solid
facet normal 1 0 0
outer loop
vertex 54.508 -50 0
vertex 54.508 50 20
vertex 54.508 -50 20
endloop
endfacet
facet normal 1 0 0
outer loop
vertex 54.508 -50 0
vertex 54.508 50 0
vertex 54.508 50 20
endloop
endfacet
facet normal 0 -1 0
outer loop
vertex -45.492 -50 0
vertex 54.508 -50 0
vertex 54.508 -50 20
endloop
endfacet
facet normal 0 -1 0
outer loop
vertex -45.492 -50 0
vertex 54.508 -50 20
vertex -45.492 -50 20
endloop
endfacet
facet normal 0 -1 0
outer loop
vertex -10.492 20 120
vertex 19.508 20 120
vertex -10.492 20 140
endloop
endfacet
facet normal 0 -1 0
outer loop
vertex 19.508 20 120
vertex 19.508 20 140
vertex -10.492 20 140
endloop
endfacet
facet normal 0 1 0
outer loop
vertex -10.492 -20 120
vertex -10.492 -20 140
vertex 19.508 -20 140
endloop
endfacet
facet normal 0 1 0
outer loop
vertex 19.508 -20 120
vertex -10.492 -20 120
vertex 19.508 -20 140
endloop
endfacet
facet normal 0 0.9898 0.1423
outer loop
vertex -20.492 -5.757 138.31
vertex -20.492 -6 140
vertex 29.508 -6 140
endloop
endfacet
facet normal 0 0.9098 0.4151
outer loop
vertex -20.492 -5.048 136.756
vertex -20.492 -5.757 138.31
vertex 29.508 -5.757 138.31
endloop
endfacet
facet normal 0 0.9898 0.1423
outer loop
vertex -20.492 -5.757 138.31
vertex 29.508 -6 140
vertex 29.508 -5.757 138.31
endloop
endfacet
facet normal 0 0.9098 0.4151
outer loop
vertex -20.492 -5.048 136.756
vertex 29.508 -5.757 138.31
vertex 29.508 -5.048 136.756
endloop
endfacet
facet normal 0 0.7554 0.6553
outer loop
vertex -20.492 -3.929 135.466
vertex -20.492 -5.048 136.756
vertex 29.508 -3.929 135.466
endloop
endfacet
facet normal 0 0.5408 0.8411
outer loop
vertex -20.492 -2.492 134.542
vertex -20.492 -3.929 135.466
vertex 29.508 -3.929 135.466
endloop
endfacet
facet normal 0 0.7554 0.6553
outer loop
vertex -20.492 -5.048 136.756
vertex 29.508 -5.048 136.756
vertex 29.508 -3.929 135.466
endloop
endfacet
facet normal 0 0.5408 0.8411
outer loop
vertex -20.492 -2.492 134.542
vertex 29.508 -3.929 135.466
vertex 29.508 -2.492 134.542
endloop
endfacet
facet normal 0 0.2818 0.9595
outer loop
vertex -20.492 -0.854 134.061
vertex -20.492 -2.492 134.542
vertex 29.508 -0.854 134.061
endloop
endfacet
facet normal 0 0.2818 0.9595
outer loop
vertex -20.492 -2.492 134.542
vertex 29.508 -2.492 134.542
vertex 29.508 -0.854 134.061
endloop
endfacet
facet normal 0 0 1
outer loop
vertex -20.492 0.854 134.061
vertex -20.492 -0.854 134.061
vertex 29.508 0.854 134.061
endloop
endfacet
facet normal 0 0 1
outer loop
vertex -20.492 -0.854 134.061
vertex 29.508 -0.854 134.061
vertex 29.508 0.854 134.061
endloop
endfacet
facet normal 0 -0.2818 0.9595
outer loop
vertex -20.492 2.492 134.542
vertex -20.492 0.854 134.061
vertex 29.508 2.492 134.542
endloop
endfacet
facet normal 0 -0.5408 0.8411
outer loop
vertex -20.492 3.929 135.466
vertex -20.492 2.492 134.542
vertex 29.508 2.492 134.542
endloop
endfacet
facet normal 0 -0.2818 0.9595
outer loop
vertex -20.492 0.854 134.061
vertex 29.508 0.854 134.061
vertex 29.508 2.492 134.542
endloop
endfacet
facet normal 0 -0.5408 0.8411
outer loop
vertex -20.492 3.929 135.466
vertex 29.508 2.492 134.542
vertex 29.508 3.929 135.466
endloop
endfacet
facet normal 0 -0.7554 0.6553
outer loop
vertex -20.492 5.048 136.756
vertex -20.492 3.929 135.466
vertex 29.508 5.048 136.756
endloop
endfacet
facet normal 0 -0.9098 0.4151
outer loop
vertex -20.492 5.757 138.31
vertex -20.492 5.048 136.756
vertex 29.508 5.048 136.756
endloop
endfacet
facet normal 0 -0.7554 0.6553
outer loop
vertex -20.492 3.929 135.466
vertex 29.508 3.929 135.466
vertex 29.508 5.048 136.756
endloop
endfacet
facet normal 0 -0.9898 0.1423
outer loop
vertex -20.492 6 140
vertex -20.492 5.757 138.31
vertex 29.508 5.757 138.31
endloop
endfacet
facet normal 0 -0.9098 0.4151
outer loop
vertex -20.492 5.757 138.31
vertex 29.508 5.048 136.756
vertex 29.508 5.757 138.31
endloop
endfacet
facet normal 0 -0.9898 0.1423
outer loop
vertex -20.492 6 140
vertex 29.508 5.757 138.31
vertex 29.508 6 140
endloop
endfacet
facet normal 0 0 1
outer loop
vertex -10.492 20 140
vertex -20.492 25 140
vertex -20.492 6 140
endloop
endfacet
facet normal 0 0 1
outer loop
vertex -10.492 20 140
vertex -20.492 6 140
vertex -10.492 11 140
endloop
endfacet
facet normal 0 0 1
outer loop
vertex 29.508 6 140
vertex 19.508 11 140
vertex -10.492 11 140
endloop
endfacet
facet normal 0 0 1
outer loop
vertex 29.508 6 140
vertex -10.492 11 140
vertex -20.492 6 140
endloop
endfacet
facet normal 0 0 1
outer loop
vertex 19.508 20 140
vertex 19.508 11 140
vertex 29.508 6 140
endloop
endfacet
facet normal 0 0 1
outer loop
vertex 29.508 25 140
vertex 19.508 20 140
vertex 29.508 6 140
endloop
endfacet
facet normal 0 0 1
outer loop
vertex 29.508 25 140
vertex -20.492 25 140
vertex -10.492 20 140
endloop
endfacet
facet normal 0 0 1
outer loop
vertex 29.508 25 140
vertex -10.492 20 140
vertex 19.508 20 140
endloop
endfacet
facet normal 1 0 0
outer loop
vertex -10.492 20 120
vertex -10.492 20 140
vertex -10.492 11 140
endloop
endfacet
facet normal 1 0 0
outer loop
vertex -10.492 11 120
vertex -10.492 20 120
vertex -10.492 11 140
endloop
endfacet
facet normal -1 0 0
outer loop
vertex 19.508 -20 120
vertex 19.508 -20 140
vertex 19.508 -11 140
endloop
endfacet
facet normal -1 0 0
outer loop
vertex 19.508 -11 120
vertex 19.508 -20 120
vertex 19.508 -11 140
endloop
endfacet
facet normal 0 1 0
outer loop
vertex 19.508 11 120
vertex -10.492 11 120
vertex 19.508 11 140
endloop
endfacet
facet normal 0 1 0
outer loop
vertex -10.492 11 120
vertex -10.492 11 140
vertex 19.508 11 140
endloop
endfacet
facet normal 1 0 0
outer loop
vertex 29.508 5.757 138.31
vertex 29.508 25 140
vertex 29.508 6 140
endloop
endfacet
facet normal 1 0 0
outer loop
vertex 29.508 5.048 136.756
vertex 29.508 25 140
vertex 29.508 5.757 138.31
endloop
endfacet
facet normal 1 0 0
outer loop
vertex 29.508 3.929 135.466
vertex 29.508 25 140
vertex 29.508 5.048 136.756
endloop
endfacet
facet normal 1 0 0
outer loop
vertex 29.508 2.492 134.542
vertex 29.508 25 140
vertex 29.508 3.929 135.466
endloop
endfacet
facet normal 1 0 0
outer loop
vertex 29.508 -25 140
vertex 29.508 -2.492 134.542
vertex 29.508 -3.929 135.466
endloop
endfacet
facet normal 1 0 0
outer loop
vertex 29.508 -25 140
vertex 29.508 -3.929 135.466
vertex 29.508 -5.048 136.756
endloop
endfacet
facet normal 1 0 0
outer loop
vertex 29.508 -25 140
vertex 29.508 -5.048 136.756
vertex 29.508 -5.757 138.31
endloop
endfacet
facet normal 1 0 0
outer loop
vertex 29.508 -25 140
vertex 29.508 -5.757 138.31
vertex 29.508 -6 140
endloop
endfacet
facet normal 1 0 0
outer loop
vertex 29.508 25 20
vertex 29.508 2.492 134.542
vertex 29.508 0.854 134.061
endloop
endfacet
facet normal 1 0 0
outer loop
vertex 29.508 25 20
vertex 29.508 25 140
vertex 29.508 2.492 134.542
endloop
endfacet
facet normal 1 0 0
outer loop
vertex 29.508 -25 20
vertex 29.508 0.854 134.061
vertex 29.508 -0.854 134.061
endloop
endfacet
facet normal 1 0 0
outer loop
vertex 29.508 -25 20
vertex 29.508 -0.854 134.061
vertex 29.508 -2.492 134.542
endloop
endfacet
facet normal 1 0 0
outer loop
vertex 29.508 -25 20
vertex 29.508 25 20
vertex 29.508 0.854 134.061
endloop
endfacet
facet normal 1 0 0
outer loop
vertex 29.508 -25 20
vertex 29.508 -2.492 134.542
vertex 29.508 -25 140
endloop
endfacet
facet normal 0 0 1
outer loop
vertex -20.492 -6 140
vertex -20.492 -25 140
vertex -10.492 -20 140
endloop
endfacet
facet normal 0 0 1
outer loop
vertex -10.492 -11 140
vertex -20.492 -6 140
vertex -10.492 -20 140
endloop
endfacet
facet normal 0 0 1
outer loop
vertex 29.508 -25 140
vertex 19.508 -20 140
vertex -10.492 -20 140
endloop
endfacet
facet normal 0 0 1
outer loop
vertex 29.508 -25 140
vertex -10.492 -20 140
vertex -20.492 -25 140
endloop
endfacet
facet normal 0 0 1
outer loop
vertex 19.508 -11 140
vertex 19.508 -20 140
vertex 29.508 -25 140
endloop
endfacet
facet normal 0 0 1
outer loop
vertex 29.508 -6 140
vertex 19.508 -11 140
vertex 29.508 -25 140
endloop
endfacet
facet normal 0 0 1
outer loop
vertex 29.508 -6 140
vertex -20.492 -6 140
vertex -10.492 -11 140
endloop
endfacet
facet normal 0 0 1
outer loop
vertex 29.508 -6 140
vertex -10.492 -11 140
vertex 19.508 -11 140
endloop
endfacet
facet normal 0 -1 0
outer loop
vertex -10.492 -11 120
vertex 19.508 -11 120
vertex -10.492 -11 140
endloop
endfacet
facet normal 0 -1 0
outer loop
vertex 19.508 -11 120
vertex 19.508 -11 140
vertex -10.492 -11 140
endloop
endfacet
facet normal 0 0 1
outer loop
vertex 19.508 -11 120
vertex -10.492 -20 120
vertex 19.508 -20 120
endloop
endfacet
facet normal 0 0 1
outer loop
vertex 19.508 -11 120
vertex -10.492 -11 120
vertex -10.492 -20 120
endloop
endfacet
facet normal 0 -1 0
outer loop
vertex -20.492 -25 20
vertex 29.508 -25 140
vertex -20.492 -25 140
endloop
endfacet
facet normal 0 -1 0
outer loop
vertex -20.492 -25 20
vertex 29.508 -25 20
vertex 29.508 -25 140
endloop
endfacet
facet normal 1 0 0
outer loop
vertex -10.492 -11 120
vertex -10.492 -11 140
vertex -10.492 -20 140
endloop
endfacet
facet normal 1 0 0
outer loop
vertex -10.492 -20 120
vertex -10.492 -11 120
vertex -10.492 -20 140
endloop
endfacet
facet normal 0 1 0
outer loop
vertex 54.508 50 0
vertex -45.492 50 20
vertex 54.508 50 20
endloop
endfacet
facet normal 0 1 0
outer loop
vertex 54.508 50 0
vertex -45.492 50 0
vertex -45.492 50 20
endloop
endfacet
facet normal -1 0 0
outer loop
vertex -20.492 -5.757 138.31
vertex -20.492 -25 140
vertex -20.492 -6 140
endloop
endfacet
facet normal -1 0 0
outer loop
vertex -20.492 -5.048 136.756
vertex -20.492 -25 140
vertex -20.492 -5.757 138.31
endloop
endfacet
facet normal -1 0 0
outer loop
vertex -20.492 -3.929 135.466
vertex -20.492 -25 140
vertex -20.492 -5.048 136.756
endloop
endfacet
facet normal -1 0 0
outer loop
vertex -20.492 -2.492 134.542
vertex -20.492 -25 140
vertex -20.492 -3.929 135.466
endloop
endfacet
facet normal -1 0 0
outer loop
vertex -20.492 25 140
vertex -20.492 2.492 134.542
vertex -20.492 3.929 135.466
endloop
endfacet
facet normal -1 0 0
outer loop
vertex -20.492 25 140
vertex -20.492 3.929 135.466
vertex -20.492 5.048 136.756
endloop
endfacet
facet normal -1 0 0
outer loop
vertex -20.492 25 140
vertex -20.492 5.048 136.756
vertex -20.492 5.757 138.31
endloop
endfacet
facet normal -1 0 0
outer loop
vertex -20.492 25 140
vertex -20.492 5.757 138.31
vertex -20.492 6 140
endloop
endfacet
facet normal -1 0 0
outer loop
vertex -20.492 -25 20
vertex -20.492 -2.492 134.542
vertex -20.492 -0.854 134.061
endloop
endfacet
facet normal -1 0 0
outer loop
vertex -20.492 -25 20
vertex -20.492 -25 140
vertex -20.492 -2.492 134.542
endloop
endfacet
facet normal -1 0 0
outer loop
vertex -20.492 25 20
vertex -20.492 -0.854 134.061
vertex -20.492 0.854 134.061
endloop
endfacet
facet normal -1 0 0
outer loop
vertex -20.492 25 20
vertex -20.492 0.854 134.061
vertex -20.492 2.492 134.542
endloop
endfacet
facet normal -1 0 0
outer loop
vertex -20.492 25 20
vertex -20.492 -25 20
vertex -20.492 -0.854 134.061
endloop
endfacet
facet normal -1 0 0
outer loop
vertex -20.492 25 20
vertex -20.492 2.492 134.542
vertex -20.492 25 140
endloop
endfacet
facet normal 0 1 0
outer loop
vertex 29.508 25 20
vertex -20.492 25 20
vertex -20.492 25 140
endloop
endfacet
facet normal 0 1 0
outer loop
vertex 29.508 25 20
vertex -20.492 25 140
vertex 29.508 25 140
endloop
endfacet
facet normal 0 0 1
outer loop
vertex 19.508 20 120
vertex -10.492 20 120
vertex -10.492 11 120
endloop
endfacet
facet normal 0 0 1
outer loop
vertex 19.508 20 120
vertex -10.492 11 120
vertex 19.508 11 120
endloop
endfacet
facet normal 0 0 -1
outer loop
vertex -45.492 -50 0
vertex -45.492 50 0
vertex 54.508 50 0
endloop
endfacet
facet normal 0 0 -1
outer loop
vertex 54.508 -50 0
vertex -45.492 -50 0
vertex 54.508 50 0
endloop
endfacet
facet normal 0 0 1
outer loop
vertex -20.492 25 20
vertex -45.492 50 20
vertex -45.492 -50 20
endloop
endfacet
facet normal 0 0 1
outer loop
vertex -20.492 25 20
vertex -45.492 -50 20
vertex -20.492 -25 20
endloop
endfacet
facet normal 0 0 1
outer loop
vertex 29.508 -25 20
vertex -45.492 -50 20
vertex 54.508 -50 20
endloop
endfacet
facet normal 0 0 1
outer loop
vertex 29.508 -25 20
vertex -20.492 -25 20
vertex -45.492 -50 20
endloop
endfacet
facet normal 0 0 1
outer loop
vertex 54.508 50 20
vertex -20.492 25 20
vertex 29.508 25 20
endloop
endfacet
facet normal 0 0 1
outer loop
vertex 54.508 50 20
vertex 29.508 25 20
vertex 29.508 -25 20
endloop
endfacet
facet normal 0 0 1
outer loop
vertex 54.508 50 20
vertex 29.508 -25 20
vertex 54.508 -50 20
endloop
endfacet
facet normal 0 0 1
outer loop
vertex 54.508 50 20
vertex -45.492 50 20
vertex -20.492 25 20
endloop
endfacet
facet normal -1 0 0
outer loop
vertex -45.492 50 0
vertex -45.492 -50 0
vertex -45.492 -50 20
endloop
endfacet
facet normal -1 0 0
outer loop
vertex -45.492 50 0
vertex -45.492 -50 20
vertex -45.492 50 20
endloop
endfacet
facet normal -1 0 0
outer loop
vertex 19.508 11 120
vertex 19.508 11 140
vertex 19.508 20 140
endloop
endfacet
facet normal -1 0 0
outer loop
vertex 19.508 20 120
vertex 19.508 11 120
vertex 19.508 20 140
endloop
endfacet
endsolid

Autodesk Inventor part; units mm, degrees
ref_plane "YZ Plane" through (0, 0, 0) normal (1, 0, 0) x (0, 1, 0)
ref_plane "XZ Plane" through (0, 0, 0) normal (0, 1, 0) x (-1, 0, 0)
ref_plane "XY Plane" through (0, 0, 0) normal (0, 0, 1) x (1, 0, 0)
sketch "Sketch1" plane through (0, 0, 0) normal (0, 0, 1) x (1, 0, 0)
  line L0 (-45.4918, 50) -> (54.5082, 50)
  line L1 (54.5082, 50) -> (54.5082, -50)
  line L2 (54.5082, -50) -> (-45.4918, -50)
  line L3 (-45.4918, -50) -> (-45.4918, 50)
  point P0 (0, 0)
  dimension "d0" = 100
  dimension "d1" = 100
extrude "Extrusion1" add sketch "Sketch1" along normal blind 20
sketch "Sketch2" plane through (0, 0, 20) normal (0, 0, 1) x (1, 0, 0)
  line L0 (-20.4918, 25) -> (29.5082, 25)
  line L1 (29.5082, 25) -> (29.5082, -25)
  line L2 (29.5082, -25) -> (-20.4918, -25)
  line L3 (-20.4918, -25) -> (-20.4918, 25)
  line L4 (54.5082, 50) -> (-45.4918, 50) projected
  line L5 (-45.4918, 50) -> (-45.4918, -50) projected
  line L6 (-45.4918, -50) -> (54.5082, -50) projected
  line L7 (54.5082, -50) -> (54.5082, 50) projected
  point P0 (0, 0)
  dimension "d4" = 25
  dimension "d5" = 25
  dimension "d6" = 25
  dimension "d7" = 25
extrude "Extrusion2" add sketch "Sketch2" along normal blind 120 contours L0 L1 L2 L3
sketch "Sketch3" plane through (29.5082, -25, 20) normal (1, 0, 0) x (0, 0, -1)
  line L0 (-120, 50) -> (-120, 0) projected
  circle A0 centre (-120, 25) radius 6
  point P0 (20, 25)
  dimension "d10" = 12
extrude "Extrusion3" cut sketch "Sketch3" against normal blind 50
sketch "Sketch4" plane through (0, 0, 140) normal (0, 0, 1) x (1, 0, 0)
  line L0 (19.5082, -11) -> (-10.4918, -11)
  line L1 (-10.4918, -11) -> (-10.4918, -20)
  line L2 (-10.4918, -20) -> (19.5082, -20)
  line L3 (19.5082, -20) -> (19.5082, -11)
  line L4 (19.5082, 20) -> (-10.4918, 20)
  line L5 (-10.4918, 20) -> (-10.4918, 11)
  line L6 (-10.4918, 11) -> (19.5082, 11)
  line L7 (19.5082, 11) -> (19.5082, 20)
  line L8 (29.5082, 6) -> (29.5082, 25) projected
  line L9 (-20.4918, 25) -> (-20.4918, 6) projected
  line L10 (29.5082, 25) -> (-20.4918, 25) projected
  line L11 (-20.4918, 6) -> (29.5082, 6) projected
  line L12 (29.5082, -6) -> (-20.4918, -6) projected
  line L13 (-20.4918, -25) -> (29.5082, -25) projected
  point P0 (0, 0)
  dimension "d13" = 10
  dimension "d14" = 10
  dimension "d15" = 5
  dimension "d16" = 5
  dimension "d17" = 5
  dimension "d18" = 5
extrude "Extrusion4" cut sketch "Sketch4" against normal blind 20 contours L3 L2 L1 L0 | L7 L6 L5 L4
equation "\"d1\" = d0"
equation "\"d5\" = d4"
equation "\"d6\" = d4"
equation "\"d7\" = d4"
properties part number "laser bottom" material "Iron, Cast"
